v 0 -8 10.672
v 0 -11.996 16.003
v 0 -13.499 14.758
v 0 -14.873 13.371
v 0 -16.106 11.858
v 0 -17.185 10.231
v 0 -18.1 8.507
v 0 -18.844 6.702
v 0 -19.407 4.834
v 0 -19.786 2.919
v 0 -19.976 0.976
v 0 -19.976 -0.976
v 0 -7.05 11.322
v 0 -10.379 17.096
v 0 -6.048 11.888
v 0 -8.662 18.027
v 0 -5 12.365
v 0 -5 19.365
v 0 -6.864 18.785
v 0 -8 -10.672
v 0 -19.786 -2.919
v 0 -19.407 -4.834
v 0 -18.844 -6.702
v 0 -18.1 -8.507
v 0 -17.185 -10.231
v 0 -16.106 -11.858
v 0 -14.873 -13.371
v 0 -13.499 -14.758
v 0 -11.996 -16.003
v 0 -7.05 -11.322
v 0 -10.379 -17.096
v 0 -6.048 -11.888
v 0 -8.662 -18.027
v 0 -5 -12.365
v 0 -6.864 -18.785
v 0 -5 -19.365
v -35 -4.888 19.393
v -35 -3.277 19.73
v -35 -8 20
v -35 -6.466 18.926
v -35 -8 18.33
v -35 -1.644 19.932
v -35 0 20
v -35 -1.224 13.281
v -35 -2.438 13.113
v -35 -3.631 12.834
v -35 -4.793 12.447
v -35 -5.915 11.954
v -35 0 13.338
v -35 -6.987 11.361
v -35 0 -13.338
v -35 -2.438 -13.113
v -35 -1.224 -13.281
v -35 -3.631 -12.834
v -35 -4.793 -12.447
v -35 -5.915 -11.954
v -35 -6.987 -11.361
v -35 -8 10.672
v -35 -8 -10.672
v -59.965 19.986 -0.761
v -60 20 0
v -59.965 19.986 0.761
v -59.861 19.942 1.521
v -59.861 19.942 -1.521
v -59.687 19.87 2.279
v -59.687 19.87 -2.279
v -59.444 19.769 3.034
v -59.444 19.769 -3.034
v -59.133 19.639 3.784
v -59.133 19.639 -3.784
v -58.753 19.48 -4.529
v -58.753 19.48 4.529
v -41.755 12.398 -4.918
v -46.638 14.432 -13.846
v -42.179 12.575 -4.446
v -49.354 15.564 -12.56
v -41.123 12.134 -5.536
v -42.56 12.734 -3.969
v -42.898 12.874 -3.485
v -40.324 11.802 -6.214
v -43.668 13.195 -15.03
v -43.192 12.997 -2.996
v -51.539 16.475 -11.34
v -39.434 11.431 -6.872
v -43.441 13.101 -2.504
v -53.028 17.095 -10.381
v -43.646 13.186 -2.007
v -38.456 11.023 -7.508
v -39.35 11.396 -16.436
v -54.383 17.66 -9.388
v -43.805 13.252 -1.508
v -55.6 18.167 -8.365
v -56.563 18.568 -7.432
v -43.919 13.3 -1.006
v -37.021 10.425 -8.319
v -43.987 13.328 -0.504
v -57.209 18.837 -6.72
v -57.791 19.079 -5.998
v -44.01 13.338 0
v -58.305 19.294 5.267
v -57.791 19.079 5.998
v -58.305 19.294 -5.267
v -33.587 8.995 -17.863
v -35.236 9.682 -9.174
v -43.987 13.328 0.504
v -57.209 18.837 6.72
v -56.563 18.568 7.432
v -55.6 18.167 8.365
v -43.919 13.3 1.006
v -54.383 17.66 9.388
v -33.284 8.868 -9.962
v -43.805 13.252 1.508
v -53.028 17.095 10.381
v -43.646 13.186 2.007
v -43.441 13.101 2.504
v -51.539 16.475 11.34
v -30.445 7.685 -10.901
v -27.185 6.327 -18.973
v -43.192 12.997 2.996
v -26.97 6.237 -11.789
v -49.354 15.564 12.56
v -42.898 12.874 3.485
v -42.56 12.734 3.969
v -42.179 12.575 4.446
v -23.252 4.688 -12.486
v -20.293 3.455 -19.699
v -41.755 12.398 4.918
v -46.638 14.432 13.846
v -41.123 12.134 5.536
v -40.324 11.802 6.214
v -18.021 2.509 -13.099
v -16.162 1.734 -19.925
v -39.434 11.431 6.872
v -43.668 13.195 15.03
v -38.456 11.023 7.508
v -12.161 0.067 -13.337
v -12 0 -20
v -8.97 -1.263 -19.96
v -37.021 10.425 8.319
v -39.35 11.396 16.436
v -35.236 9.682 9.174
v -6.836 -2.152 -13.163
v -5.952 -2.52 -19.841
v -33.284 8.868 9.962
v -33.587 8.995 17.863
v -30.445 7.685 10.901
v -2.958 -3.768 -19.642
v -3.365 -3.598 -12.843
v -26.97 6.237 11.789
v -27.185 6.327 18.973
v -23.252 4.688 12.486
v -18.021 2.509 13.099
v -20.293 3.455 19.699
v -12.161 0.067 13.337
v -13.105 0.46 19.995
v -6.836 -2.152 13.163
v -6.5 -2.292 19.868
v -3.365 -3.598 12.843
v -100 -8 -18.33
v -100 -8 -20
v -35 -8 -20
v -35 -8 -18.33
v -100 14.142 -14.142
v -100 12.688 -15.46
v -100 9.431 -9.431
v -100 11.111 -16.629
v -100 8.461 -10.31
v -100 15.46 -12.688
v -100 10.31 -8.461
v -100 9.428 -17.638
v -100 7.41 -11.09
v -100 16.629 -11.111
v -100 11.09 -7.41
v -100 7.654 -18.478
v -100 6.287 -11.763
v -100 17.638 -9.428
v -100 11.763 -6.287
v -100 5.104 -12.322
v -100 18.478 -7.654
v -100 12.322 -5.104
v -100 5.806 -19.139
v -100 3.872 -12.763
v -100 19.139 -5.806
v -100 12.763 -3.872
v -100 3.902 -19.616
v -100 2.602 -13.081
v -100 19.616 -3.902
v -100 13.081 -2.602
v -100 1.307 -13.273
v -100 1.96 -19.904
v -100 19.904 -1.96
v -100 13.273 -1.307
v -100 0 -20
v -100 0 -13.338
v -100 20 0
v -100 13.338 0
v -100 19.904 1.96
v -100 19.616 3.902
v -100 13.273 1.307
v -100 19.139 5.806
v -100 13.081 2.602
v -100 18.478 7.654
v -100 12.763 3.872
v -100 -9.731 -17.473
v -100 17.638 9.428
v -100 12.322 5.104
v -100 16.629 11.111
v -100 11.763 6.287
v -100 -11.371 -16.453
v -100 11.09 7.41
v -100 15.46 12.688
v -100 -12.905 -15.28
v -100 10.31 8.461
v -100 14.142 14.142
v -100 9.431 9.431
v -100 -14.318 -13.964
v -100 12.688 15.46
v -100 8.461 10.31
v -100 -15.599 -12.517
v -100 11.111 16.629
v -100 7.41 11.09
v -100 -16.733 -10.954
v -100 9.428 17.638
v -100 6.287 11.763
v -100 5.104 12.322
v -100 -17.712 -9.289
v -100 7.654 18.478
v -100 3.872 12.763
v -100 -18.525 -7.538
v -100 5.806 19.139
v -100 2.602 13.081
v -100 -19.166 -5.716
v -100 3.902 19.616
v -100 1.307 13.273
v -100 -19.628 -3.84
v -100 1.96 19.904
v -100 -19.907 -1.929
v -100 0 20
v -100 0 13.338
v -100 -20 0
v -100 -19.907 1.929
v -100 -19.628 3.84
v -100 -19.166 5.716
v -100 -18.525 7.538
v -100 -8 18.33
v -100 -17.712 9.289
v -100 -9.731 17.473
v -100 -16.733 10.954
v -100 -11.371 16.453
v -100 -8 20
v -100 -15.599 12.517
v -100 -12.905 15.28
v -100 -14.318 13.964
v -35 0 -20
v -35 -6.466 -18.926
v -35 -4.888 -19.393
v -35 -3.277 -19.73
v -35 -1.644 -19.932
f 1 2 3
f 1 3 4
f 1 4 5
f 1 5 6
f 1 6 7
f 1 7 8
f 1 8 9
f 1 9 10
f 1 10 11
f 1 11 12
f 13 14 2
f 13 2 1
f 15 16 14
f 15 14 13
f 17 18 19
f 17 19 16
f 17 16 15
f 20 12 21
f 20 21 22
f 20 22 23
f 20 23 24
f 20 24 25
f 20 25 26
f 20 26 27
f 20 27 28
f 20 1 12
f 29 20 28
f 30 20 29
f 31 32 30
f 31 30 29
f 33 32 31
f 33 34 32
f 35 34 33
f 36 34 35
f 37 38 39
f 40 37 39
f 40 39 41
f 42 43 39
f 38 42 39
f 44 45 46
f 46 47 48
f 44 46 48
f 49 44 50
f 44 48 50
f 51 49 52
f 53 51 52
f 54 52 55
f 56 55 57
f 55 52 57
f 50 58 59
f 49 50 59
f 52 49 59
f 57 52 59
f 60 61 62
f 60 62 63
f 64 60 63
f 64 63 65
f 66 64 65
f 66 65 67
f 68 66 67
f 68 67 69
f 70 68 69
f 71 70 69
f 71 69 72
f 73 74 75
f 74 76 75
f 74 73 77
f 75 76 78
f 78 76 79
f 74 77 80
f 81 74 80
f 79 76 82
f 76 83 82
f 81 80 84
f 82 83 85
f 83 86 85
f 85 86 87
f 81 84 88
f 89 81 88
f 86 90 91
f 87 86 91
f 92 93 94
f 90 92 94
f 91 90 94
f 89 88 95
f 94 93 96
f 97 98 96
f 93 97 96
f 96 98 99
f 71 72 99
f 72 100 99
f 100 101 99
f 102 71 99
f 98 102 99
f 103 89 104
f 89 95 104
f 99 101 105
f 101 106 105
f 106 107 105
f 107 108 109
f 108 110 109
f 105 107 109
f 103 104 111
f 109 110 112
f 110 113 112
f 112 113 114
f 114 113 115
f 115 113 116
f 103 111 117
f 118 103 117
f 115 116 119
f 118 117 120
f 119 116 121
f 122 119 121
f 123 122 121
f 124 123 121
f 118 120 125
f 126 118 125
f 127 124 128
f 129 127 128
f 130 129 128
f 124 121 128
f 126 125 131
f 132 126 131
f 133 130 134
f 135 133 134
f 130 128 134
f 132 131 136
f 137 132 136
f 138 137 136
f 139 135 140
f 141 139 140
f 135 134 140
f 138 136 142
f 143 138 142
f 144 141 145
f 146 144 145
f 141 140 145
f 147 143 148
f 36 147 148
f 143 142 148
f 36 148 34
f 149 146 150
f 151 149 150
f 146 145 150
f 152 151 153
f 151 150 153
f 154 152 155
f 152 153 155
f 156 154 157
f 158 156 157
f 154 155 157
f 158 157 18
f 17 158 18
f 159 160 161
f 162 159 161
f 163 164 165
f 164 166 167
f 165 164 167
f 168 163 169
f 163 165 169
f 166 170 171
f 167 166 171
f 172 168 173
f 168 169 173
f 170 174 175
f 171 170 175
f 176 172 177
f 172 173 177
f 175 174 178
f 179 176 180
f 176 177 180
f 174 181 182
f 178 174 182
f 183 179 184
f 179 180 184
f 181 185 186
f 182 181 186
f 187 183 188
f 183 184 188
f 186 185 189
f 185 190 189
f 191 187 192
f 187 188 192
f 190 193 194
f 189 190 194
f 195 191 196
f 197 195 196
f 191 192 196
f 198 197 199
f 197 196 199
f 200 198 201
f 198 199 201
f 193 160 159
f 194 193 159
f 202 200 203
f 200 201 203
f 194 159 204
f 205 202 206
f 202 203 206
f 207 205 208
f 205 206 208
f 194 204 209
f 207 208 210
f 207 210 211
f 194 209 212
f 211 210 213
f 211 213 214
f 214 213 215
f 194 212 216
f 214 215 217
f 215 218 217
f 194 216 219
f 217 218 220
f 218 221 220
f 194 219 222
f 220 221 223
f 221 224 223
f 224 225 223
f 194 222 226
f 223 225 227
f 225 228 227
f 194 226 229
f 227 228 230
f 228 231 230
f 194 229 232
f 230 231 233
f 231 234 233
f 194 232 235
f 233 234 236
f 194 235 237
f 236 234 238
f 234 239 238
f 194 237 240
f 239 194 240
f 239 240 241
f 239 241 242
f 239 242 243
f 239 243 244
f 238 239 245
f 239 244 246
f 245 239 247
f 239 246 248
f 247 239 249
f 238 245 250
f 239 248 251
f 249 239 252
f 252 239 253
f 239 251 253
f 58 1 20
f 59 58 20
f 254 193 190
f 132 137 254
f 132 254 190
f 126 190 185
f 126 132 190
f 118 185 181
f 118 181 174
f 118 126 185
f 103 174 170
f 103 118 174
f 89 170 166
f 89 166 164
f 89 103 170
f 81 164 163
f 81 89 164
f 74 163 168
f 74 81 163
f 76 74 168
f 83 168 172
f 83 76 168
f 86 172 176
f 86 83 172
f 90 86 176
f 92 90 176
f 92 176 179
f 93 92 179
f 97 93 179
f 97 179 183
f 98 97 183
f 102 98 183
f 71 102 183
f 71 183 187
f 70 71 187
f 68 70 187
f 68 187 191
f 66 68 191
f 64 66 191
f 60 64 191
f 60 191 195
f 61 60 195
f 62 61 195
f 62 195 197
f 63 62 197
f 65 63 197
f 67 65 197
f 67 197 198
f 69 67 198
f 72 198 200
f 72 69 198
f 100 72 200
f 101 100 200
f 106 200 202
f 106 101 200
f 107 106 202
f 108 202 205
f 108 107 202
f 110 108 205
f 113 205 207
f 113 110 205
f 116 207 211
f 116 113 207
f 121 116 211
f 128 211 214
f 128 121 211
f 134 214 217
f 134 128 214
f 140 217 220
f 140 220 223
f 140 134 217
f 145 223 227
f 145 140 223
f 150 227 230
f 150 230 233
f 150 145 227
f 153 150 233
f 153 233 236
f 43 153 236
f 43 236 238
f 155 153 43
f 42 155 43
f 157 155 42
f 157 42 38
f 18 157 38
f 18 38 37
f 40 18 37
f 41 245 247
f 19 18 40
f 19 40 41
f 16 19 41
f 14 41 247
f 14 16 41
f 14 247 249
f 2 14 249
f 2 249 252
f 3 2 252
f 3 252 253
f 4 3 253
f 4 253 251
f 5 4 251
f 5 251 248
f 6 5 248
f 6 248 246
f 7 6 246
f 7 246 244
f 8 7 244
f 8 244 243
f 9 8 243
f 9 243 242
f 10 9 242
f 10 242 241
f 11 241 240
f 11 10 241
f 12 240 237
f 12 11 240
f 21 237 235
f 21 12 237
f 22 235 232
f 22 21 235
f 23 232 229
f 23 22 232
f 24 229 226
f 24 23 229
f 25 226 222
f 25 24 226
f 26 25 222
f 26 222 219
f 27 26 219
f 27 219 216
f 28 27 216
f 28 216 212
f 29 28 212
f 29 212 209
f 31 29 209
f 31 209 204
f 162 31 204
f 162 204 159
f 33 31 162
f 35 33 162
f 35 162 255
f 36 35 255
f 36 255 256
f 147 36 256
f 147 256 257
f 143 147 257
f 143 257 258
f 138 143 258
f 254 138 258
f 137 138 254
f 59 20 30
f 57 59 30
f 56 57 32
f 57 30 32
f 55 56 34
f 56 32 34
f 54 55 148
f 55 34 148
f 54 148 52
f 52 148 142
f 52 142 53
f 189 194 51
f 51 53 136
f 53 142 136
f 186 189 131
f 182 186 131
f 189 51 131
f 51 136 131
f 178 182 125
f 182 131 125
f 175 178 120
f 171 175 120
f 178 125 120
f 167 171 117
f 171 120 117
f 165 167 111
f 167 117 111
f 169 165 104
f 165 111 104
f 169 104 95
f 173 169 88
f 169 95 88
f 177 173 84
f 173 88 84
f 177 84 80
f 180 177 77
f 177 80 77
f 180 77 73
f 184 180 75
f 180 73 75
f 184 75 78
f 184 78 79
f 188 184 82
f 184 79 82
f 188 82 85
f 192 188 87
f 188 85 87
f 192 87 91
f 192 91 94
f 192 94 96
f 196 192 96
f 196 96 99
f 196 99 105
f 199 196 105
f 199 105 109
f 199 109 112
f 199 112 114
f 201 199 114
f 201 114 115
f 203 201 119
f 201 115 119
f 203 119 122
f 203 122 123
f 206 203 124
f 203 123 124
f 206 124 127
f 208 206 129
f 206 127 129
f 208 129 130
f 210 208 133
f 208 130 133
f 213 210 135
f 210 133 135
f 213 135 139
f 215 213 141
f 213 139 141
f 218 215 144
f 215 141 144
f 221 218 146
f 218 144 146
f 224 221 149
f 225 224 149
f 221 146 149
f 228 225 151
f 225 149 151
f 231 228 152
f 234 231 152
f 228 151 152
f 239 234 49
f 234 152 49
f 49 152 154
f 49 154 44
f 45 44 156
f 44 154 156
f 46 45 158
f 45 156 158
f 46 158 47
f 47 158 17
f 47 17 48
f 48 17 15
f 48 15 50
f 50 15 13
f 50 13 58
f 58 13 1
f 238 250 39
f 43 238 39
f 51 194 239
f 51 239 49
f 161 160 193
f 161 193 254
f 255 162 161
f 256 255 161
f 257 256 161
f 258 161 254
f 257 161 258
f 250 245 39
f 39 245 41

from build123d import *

# Parameters (mm, degrees)
SKETCH1_R               = 20
BOSS_EXTRUDE1_DEPTH     = 100
SKETCH2_W               = 65
SKETCH2_H               = 9.328019595
SKETCH2_H_2             = 21.34396081
BOSS_EXTRUDE2_DEPTH     = 8
CUT_EXTRUDE2_DEPTH      = 21
CUT_EXTRUDE2_DEPTH_BACK = 21


with BuildPart() as part:
    # Sketch1 → Boss-Extrude1 (new body)
    with BuildSketch(Plane(origin=(0, 0, 0), x_dir=(0, 0, -1), z_dir=(1, 0, 0))):
        Circle(SKETCH1_R)
        with BuildLine():
            Line((-10.671980405, -8), (10.671980405, -8))
            ThreePointArc((10.671980405, -8), (0, 13.337584705), (-10.671980405, -8))
        make_face(mode=Mode.SUBTRACT)
    extrude(amount=-BOSS_EXTRUDE1_DEPTH)

    # Sketch2 → Boss-Extrude2 (add)
    with BuildSketch(Plane(origin=(0, -8, 0), x_dir=(1, 0, 0), z_dir=(0, 1, 0))):
        with Locations((-67.5, 15.335990202)):
            Rectangle(SKETCH2_W, SKETCH2_H)
        with Locations((-67.5, 0)):
            Rectangle(SKETCH2_W, SKETCH2_H_2)
        with Locations((-67.5, -15.335990202)):
            Rectangle(SKETCH2_W, SKETCH2_H)
    extrude(amount=BOSS_EXTRUDE2_DEPTH)

    # Sketch3 → Cut-Extrude2 (cut, two sides)
    with BuildSketch(Plane.XY) as cut_extrude2_sk:
        Polygon((0, 20), (-60, 20), (0, -5), align=None)
    extrude(amount=CUT_EXTRUDE2_DEPTH, mode=Mode.SUBTRACT)
    extrude(cut_extrude2_sk.sketch, amount=-CUT_EXTRUDE2_DEPTH_BACK, mode=Mode.SUBTRACT)


solid = part.part
